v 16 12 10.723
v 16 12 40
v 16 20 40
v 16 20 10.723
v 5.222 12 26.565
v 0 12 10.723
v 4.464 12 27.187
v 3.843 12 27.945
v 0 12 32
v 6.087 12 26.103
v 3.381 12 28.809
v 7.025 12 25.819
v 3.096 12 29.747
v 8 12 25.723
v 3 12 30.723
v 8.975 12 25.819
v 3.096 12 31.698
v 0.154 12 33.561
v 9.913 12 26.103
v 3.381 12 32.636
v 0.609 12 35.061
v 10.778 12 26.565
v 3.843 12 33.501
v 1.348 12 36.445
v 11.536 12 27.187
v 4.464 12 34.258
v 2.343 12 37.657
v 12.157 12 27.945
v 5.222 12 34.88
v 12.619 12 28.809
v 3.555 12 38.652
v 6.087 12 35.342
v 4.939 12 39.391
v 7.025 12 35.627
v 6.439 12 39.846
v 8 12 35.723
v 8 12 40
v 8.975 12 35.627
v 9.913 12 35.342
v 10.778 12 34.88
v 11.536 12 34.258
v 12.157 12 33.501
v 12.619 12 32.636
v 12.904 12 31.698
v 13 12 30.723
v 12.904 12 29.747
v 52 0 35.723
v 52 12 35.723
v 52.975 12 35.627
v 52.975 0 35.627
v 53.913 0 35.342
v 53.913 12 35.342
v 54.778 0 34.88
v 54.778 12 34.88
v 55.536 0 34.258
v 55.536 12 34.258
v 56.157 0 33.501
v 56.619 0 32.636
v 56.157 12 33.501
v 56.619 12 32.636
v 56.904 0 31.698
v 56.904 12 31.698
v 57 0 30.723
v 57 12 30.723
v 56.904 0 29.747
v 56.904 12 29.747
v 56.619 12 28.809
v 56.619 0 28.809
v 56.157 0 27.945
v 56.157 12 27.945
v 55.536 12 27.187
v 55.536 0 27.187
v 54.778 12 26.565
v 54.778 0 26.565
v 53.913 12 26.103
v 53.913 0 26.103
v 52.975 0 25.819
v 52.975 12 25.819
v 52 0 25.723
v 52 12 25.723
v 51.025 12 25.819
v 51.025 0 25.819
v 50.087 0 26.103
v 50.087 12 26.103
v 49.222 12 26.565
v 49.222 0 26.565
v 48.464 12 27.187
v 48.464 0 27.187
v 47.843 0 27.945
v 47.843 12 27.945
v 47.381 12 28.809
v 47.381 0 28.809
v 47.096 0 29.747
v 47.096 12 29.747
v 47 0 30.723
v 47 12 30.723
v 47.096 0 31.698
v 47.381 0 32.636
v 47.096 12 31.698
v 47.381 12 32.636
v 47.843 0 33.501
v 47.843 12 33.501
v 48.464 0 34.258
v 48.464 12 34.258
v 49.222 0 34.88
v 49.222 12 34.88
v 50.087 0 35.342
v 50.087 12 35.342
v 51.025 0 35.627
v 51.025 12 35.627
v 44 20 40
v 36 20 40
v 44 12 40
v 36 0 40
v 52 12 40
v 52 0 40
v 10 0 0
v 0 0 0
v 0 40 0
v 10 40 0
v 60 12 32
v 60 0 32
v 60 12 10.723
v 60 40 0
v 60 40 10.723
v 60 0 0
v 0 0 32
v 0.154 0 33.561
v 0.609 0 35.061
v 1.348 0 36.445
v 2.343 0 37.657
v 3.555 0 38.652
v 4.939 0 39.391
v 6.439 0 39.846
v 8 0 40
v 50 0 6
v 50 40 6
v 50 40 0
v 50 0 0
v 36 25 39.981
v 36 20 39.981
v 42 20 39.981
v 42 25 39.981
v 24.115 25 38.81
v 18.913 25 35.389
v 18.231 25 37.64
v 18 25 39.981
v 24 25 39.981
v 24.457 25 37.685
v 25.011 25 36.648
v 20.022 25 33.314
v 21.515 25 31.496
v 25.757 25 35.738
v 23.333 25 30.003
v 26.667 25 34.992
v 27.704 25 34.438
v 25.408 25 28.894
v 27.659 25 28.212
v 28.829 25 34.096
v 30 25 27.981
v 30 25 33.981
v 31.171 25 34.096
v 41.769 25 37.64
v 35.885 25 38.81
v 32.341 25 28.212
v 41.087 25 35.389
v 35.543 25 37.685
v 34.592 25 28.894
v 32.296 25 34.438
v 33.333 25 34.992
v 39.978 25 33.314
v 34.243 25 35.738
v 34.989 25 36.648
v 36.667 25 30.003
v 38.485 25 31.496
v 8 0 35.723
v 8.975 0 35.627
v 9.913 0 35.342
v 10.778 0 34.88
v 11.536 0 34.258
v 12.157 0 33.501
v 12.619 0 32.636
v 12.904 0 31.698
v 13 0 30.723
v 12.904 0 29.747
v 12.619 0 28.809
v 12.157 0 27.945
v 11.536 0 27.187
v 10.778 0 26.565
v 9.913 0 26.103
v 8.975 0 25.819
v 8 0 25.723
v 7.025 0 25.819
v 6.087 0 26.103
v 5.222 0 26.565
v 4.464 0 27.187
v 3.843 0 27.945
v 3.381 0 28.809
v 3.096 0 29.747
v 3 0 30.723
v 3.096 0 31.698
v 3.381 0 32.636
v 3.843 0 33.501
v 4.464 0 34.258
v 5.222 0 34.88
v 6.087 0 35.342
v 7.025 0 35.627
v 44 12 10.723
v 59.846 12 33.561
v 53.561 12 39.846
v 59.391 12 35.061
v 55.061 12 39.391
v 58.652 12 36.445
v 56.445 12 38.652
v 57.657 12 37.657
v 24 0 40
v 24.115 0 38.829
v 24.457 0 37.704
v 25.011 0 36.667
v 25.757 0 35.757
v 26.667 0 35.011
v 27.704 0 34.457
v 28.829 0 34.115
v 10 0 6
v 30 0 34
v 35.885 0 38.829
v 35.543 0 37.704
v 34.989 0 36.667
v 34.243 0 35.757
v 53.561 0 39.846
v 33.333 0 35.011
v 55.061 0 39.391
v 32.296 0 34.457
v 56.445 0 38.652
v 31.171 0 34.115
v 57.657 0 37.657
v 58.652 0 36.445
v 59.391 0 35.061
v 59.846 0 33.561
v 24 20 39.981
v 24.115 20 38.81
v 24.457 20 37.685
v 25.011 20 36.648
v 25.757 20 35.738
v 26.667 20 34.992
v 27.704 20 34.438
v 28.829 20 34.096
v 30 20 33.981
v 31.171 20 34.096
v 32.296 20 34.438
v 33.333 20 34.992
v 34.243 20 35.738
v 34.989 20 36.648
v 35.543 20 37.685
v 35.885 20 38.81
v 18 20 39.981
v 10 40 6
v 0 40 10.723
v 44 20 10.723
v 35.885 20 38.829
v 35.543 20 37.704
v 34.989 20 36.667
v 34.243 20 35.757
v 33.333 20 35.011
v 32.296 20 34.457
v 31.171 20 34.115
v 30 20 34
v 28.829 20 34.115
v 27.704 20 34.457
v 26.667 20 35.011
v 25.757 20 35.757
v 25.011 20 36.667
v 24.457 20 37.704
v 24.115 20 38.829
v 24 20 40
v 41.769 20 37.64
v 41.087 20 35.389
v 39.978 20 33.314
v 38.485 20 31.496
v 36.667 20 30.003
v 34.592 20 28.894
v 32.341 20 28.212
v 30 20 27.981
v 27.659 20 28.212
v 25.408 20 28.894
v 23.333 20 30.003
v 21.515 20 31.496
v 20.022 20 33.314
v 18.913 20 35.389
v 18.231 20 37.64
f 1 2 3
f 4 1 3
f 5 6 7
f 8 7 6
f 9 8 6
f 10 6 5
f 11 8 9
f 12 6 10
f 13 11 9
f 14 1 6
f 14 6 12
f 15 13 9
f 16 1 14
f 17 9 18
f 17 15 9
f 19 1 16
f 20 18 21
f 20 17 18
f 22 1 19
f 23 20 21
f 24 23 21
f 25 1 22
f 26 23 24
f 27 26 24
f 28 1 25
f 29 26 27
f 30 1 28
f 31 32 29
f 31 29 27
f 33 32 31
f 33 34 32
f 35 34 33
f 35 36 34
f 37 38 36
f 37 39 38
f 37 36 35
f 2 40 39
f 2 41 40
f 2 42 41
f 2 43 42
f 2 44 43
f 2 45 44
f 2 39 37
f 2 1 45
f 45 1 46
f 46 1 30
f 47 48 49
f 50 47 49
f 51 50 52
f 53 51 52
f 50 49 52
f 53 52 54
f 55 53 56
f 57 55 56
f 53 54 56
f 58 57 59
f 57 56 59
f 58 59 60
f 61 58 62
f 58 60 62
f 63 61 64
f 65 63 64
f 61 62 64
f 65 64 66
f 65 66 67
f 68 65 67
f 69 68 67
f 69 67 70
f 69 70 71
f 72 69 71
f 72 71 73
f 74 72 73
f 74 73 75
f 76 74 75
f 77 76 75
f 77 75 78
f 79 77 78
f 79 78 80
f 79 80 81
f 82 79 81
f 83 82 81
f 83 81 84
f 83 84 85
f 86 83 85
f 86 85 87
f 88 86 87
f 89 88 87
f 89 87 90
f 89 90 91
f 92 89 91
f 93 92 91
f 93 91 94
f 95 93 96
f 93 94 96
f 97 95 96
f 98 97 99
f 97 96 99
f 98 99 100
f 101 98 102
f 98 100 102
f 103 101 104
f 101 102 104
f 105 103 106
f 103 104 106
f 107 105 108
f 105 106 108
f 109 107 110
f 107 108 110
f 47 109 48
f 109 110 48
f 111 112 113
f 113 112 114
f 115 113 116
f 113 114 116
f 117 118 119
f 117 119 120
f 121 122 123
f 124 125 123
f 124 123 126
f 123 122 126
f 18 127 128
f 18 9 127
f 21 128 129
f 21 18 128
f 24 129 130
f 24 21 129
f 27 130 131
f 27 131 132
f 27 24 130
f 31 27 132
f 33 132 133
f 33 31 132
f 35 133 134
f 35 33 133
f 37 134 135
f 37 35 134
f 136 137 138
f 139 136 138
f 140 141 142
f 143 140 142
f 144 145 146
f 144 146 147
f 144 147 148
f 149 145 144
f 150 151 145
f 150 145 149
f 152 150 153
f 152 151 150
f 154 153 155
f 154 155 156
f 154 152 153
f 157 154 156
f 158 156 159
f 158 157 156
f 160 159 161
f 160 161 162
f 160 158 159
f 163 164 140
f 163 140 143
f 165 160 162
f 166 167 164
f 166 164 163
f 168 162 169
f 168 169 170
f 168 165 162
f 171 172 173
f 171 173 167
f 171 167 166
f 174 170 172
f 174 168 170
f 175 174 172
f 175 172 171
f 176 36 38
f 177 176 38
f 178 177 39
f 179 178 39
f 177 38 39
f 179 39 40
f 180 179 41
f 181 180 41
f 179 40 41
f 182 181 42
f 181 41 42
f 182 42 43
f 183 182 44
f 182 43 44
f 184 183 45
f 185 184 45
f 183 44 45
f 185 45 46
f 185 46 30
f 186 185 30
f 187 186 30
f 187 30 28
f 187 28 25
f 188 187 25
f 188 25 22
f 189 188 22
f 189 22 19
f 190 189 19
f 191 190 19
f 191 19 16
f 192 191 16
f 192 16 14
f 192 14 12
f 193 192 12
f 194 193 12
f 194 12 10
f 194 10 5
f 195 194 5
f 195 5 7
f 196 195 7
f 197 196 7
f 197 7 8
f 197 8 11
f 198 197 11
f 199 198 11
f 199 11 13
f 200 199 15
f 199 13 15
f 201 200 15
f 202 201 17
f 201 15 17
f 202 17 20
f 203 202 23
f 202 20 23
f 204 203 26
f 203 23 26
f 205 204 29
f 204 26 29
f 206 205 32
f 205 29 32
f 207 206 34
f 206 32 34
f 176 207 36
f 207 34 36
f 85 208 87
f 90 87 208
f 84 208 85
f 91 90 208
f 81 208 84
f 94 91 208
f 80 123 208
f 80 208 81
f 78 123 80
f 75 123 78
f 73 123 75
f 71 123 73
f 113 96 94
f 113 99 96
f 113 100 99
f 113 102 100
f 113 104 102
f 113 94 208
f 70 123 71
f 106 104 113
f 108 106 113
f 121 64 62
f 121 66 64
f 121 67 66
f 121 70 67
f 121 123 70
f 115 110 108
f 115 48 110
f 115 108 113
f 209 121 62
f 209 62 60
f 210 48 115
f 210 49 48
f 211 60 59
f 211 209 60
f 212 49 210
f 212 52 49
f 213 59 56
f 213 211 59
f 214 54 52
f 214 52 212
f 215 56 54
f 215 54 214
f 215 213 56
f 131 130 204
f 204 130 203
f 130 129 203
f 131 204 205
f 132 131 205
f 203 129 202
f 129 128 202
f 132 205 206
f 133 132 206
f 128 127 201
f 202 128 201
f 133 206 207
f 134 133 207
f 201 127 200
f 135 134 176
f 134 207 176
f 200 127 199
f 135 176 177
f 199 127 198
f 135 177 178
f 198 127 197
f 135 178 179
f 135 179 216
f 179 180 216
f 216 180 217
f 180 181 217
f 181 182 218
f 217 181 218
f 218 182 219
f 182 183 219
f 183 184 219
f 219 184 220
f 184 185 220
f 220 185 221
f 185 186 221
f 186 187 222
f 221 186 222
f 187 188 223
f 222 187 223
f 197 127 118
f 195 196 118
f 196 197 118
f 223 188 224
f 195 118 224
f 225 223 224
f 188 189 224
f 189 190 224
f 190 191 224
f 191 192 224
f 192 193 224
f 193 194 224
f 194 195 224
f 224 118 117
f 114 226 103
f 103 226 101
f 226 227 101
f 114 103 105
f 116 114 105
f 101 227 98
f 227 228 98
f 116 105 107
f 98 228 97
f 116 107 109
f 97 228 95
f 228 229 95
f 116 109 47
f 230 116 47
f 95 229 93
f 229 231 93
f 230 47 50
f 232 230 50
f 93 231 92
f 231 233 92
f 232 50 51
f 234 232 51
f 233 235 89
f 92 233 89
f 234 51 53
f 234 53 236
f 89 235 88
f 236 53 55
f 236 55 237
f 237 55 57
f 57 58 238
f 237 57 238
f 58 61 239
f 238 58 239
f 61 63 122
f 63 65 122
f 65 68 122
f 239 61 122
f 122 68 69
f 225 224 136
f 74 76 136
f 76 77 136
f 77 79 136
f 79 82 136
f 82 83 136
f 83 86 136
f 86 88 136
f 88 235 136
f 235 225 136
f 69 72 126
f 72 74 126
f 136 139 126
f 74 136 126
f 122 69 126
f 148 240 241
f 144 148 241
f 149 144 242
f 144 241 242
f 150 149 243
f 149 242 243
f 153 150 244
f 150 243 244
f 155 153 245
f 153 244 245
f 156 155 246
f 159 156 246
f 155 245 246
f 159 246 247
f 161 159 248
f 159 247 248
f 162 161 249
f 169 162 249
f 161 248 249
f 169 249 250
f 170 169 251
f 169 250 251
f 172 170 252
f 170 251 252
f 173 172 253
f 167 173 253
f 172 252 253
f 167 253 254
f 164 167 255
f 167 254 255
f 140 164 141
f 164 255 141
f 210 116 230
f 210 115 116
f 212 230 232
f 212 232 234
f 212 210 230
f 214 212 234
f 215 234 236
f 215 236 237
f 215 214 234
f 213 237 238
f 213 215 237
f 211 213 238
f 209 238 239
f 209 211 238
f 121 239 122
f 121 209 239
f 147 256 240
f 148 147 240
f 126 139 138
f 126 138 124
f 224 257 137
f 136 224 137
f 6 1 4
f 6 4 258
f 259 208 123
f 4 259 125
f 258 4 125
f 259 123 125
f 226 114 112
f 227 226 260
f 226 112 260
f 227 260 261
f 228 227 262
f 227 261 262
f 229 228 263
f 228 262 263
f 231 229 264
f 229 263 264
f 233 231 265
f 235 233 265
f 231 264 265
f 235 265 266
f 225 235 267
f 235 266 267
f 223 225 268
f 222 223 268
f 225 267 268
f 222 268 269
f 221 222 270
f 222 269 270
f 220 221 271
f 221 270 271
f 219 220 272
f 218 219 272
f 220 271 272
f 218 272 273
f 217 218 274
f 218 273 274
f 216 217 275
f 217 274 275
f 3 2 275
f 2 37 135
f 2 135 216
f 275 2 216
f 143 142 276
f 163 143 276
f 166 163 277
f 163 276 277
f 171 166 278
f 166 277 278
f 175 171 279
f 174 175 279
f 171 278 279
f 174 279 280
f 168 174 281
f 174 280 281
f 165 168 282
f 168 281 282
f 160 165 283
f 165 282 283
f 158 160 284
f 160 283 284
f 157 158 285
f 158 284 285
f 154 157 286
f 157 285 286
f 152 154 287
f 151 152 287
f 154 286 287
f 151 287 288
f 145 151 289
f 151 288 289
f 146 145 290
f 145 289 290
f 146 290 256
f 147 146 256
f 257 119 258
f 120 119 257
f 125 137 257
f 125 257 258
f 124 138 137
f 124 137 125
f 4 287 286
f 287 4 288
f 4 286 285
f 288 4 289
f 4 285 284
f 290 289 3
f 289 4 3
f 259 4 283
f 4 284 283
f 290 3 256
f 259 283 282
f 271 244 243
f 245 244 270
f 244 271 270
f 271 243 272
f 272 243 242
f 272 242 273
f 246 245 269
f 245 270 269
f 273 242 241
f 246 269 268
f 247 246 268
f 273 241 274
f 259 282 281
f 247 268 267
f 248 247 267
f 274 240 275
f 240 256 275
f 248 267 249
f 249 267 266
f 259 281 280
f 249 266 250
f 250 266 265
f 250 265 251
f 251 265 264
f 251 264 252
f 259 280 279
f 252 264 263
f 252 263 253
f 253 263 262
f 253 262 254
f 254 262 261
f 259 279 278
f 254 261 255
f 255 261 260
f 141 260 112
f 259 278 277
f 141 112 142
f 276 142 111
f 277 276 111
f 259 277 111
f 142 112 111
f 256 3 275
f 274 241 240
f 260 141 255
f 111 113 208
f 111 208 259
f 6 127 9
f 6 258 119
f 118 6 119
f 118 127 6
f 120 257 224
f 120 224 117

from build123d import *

# Parameters (mm, degrees)
SKETCH_1_W               = 60
SKETCH_1_H               = 40
EXTRUDE_1_DEPTH          = 40
SKETCH_2_W               = 40
SKETCH_2_H               = 6
CUT_EXTRUDE_1_DEPTH      = 83.462112512
CUT_EXTRUDE_2_DEPTH      = 76.498344353
CUT_EXTRUDE_2_DEPTH_BACK = 76.498344353
SKETCH_6_W               = 29.277204284
SKETCH_6_H               = 28
EXTRUDE_2_REACH          = 84.462
SKETCH_7_W               = 28
SKETCH_7_H               = 8
EXTRUDE_4_DEPTH          = 5
SKETCH_12_R              = 5
CUT_EXTRUDE_4_DEPTH      = 78.356318423
FILLET_1_R               = 8
SKETCH_14_R              = 6
CUT_EXTRUDE_5_DEPTH      = 75.833147735


with BuildPart() as part:
    # 草图1 → 凸台-拉伸1 (new body)
    with BuildSketch(Plane(origin=(0, 0, 0), x_dir=(1, 0, 0), z_dir=(0, 1, 0))):
        with Locations((30, -20)):
            Rectangle(SKETCH_1_W, SKETCH_1_H)
    extrude(amount=EXTRUDE_1_DEPTH)

    # 草图2 → 切除-拉伸1 (cut, through all)
    with BuildSketch(Plane(origin=(0, 40, 0), x_dir=(1, 0, 0), z_dir=(0, 1, 0))):
        with Locations((30, -3)):
            Rectangle(SKETCH_2_W, SKETCH_2_H)
    extrude(amount=-CUT_EXTRUDE_1_DEPTH, mode=Mode.SUBTRACT)

    # 草图6 → 切除-拉伸2 (cut, two sides: drawn at the far end of the back side and taken through both)
    with BuildSketch(Plane.ZY.offset(-50).offset(-CUT_EXTRUDE_2_DEPTH_BACK)):
        with Locations((25.361397858, 26)):
            Rectangle(SKETCH_6_W, SKETCH_6_H)
    extrude(amount=CUT_EXTRUDE_2_DEPTH + CUT_EXTRUDE_2_DEPTH_BACK, mode=Mode.SUBTRACT)

    # 草图7 → 凸台-拉伸2 (add, up to next)
    with BuildSketch(Plane.XY.offset(40), mode=Mode.PRIVATE) as extrude_2_sk1:
        with Locations((30, 16)):
            Rectangle(SKETCH_7_W, SKETCH_7_H)
    extrude_2_tool1 = extrude(extrude_2_sk1.sketch, amount=-EXTRUDE_2_REACH, mode=Mode.PRIVATE) - part.part
    add(extrude_2_tool1.solids().sort_by_distance((30, 16, 40))[0])

    # 草图8 → 凸台-拉伸4 (add)
    with BuildSketch(Plane(origin=(0, 20, 0), x_dir=(1, 0, 0), z_dir=(0, 1, 0))):
        with BuildLine():
            ThreePointArc((24, -39.980933727), (30, -33.980933727), (36, -39.980933727))
            Line((36, -39.980933727), (42, -39.980933727))
            ThreePointArc((42, -39.980933727), (30, -27.980933727), (18, -39.980933727))
            Line((18, -39.980933727), (24, -39.980933727))
        make_face()
    extrude(amount=EXTRUDE_4_DEPTH)

    # 草图12 → 切除-拉伸4 (cut, through all)
    with BuildSketch(Plane(origin=(0, 12, 0), x_dir=(1, 0, 0), z_dir=(0, 1, 0))):
        with Locations(Location((8, -30.722795716, 0), (0, 0, 270))):
            Circle(SKETCH_12_R)
        with Locations(Location((52, -30.722795716, 0), (0, 0, 270))):
            Circle(SKETCH_12_R)
    extrude(amount=-CUT_EXTRUDE_4_DEPTH, mode=Mode.SUBTRACT)

    # 圆角1
    fillet_1_edges = [part.edges().sort_by_distance(p)[0] for p in [
        (60, 6, 40),
        (0, 6, 40),
    ]]
    fillet(fillet_1_edges, radius=FILLET_1_R)

    # 草图14 → 切除-拉伸5 (cut, through all)
    with BuildSketch(Plane(origin=(0, 20, 0), x_dir=(1, 0, 0), z_dir=(0, 1, 0))):
        with Locations((30, -40)):
            Circle(SKETCH_14_R)
    extrude(amount=-CUT_EXTRUDE_5_DEPTH, mode=Mode.SUBTRACT)


solid = part.part
